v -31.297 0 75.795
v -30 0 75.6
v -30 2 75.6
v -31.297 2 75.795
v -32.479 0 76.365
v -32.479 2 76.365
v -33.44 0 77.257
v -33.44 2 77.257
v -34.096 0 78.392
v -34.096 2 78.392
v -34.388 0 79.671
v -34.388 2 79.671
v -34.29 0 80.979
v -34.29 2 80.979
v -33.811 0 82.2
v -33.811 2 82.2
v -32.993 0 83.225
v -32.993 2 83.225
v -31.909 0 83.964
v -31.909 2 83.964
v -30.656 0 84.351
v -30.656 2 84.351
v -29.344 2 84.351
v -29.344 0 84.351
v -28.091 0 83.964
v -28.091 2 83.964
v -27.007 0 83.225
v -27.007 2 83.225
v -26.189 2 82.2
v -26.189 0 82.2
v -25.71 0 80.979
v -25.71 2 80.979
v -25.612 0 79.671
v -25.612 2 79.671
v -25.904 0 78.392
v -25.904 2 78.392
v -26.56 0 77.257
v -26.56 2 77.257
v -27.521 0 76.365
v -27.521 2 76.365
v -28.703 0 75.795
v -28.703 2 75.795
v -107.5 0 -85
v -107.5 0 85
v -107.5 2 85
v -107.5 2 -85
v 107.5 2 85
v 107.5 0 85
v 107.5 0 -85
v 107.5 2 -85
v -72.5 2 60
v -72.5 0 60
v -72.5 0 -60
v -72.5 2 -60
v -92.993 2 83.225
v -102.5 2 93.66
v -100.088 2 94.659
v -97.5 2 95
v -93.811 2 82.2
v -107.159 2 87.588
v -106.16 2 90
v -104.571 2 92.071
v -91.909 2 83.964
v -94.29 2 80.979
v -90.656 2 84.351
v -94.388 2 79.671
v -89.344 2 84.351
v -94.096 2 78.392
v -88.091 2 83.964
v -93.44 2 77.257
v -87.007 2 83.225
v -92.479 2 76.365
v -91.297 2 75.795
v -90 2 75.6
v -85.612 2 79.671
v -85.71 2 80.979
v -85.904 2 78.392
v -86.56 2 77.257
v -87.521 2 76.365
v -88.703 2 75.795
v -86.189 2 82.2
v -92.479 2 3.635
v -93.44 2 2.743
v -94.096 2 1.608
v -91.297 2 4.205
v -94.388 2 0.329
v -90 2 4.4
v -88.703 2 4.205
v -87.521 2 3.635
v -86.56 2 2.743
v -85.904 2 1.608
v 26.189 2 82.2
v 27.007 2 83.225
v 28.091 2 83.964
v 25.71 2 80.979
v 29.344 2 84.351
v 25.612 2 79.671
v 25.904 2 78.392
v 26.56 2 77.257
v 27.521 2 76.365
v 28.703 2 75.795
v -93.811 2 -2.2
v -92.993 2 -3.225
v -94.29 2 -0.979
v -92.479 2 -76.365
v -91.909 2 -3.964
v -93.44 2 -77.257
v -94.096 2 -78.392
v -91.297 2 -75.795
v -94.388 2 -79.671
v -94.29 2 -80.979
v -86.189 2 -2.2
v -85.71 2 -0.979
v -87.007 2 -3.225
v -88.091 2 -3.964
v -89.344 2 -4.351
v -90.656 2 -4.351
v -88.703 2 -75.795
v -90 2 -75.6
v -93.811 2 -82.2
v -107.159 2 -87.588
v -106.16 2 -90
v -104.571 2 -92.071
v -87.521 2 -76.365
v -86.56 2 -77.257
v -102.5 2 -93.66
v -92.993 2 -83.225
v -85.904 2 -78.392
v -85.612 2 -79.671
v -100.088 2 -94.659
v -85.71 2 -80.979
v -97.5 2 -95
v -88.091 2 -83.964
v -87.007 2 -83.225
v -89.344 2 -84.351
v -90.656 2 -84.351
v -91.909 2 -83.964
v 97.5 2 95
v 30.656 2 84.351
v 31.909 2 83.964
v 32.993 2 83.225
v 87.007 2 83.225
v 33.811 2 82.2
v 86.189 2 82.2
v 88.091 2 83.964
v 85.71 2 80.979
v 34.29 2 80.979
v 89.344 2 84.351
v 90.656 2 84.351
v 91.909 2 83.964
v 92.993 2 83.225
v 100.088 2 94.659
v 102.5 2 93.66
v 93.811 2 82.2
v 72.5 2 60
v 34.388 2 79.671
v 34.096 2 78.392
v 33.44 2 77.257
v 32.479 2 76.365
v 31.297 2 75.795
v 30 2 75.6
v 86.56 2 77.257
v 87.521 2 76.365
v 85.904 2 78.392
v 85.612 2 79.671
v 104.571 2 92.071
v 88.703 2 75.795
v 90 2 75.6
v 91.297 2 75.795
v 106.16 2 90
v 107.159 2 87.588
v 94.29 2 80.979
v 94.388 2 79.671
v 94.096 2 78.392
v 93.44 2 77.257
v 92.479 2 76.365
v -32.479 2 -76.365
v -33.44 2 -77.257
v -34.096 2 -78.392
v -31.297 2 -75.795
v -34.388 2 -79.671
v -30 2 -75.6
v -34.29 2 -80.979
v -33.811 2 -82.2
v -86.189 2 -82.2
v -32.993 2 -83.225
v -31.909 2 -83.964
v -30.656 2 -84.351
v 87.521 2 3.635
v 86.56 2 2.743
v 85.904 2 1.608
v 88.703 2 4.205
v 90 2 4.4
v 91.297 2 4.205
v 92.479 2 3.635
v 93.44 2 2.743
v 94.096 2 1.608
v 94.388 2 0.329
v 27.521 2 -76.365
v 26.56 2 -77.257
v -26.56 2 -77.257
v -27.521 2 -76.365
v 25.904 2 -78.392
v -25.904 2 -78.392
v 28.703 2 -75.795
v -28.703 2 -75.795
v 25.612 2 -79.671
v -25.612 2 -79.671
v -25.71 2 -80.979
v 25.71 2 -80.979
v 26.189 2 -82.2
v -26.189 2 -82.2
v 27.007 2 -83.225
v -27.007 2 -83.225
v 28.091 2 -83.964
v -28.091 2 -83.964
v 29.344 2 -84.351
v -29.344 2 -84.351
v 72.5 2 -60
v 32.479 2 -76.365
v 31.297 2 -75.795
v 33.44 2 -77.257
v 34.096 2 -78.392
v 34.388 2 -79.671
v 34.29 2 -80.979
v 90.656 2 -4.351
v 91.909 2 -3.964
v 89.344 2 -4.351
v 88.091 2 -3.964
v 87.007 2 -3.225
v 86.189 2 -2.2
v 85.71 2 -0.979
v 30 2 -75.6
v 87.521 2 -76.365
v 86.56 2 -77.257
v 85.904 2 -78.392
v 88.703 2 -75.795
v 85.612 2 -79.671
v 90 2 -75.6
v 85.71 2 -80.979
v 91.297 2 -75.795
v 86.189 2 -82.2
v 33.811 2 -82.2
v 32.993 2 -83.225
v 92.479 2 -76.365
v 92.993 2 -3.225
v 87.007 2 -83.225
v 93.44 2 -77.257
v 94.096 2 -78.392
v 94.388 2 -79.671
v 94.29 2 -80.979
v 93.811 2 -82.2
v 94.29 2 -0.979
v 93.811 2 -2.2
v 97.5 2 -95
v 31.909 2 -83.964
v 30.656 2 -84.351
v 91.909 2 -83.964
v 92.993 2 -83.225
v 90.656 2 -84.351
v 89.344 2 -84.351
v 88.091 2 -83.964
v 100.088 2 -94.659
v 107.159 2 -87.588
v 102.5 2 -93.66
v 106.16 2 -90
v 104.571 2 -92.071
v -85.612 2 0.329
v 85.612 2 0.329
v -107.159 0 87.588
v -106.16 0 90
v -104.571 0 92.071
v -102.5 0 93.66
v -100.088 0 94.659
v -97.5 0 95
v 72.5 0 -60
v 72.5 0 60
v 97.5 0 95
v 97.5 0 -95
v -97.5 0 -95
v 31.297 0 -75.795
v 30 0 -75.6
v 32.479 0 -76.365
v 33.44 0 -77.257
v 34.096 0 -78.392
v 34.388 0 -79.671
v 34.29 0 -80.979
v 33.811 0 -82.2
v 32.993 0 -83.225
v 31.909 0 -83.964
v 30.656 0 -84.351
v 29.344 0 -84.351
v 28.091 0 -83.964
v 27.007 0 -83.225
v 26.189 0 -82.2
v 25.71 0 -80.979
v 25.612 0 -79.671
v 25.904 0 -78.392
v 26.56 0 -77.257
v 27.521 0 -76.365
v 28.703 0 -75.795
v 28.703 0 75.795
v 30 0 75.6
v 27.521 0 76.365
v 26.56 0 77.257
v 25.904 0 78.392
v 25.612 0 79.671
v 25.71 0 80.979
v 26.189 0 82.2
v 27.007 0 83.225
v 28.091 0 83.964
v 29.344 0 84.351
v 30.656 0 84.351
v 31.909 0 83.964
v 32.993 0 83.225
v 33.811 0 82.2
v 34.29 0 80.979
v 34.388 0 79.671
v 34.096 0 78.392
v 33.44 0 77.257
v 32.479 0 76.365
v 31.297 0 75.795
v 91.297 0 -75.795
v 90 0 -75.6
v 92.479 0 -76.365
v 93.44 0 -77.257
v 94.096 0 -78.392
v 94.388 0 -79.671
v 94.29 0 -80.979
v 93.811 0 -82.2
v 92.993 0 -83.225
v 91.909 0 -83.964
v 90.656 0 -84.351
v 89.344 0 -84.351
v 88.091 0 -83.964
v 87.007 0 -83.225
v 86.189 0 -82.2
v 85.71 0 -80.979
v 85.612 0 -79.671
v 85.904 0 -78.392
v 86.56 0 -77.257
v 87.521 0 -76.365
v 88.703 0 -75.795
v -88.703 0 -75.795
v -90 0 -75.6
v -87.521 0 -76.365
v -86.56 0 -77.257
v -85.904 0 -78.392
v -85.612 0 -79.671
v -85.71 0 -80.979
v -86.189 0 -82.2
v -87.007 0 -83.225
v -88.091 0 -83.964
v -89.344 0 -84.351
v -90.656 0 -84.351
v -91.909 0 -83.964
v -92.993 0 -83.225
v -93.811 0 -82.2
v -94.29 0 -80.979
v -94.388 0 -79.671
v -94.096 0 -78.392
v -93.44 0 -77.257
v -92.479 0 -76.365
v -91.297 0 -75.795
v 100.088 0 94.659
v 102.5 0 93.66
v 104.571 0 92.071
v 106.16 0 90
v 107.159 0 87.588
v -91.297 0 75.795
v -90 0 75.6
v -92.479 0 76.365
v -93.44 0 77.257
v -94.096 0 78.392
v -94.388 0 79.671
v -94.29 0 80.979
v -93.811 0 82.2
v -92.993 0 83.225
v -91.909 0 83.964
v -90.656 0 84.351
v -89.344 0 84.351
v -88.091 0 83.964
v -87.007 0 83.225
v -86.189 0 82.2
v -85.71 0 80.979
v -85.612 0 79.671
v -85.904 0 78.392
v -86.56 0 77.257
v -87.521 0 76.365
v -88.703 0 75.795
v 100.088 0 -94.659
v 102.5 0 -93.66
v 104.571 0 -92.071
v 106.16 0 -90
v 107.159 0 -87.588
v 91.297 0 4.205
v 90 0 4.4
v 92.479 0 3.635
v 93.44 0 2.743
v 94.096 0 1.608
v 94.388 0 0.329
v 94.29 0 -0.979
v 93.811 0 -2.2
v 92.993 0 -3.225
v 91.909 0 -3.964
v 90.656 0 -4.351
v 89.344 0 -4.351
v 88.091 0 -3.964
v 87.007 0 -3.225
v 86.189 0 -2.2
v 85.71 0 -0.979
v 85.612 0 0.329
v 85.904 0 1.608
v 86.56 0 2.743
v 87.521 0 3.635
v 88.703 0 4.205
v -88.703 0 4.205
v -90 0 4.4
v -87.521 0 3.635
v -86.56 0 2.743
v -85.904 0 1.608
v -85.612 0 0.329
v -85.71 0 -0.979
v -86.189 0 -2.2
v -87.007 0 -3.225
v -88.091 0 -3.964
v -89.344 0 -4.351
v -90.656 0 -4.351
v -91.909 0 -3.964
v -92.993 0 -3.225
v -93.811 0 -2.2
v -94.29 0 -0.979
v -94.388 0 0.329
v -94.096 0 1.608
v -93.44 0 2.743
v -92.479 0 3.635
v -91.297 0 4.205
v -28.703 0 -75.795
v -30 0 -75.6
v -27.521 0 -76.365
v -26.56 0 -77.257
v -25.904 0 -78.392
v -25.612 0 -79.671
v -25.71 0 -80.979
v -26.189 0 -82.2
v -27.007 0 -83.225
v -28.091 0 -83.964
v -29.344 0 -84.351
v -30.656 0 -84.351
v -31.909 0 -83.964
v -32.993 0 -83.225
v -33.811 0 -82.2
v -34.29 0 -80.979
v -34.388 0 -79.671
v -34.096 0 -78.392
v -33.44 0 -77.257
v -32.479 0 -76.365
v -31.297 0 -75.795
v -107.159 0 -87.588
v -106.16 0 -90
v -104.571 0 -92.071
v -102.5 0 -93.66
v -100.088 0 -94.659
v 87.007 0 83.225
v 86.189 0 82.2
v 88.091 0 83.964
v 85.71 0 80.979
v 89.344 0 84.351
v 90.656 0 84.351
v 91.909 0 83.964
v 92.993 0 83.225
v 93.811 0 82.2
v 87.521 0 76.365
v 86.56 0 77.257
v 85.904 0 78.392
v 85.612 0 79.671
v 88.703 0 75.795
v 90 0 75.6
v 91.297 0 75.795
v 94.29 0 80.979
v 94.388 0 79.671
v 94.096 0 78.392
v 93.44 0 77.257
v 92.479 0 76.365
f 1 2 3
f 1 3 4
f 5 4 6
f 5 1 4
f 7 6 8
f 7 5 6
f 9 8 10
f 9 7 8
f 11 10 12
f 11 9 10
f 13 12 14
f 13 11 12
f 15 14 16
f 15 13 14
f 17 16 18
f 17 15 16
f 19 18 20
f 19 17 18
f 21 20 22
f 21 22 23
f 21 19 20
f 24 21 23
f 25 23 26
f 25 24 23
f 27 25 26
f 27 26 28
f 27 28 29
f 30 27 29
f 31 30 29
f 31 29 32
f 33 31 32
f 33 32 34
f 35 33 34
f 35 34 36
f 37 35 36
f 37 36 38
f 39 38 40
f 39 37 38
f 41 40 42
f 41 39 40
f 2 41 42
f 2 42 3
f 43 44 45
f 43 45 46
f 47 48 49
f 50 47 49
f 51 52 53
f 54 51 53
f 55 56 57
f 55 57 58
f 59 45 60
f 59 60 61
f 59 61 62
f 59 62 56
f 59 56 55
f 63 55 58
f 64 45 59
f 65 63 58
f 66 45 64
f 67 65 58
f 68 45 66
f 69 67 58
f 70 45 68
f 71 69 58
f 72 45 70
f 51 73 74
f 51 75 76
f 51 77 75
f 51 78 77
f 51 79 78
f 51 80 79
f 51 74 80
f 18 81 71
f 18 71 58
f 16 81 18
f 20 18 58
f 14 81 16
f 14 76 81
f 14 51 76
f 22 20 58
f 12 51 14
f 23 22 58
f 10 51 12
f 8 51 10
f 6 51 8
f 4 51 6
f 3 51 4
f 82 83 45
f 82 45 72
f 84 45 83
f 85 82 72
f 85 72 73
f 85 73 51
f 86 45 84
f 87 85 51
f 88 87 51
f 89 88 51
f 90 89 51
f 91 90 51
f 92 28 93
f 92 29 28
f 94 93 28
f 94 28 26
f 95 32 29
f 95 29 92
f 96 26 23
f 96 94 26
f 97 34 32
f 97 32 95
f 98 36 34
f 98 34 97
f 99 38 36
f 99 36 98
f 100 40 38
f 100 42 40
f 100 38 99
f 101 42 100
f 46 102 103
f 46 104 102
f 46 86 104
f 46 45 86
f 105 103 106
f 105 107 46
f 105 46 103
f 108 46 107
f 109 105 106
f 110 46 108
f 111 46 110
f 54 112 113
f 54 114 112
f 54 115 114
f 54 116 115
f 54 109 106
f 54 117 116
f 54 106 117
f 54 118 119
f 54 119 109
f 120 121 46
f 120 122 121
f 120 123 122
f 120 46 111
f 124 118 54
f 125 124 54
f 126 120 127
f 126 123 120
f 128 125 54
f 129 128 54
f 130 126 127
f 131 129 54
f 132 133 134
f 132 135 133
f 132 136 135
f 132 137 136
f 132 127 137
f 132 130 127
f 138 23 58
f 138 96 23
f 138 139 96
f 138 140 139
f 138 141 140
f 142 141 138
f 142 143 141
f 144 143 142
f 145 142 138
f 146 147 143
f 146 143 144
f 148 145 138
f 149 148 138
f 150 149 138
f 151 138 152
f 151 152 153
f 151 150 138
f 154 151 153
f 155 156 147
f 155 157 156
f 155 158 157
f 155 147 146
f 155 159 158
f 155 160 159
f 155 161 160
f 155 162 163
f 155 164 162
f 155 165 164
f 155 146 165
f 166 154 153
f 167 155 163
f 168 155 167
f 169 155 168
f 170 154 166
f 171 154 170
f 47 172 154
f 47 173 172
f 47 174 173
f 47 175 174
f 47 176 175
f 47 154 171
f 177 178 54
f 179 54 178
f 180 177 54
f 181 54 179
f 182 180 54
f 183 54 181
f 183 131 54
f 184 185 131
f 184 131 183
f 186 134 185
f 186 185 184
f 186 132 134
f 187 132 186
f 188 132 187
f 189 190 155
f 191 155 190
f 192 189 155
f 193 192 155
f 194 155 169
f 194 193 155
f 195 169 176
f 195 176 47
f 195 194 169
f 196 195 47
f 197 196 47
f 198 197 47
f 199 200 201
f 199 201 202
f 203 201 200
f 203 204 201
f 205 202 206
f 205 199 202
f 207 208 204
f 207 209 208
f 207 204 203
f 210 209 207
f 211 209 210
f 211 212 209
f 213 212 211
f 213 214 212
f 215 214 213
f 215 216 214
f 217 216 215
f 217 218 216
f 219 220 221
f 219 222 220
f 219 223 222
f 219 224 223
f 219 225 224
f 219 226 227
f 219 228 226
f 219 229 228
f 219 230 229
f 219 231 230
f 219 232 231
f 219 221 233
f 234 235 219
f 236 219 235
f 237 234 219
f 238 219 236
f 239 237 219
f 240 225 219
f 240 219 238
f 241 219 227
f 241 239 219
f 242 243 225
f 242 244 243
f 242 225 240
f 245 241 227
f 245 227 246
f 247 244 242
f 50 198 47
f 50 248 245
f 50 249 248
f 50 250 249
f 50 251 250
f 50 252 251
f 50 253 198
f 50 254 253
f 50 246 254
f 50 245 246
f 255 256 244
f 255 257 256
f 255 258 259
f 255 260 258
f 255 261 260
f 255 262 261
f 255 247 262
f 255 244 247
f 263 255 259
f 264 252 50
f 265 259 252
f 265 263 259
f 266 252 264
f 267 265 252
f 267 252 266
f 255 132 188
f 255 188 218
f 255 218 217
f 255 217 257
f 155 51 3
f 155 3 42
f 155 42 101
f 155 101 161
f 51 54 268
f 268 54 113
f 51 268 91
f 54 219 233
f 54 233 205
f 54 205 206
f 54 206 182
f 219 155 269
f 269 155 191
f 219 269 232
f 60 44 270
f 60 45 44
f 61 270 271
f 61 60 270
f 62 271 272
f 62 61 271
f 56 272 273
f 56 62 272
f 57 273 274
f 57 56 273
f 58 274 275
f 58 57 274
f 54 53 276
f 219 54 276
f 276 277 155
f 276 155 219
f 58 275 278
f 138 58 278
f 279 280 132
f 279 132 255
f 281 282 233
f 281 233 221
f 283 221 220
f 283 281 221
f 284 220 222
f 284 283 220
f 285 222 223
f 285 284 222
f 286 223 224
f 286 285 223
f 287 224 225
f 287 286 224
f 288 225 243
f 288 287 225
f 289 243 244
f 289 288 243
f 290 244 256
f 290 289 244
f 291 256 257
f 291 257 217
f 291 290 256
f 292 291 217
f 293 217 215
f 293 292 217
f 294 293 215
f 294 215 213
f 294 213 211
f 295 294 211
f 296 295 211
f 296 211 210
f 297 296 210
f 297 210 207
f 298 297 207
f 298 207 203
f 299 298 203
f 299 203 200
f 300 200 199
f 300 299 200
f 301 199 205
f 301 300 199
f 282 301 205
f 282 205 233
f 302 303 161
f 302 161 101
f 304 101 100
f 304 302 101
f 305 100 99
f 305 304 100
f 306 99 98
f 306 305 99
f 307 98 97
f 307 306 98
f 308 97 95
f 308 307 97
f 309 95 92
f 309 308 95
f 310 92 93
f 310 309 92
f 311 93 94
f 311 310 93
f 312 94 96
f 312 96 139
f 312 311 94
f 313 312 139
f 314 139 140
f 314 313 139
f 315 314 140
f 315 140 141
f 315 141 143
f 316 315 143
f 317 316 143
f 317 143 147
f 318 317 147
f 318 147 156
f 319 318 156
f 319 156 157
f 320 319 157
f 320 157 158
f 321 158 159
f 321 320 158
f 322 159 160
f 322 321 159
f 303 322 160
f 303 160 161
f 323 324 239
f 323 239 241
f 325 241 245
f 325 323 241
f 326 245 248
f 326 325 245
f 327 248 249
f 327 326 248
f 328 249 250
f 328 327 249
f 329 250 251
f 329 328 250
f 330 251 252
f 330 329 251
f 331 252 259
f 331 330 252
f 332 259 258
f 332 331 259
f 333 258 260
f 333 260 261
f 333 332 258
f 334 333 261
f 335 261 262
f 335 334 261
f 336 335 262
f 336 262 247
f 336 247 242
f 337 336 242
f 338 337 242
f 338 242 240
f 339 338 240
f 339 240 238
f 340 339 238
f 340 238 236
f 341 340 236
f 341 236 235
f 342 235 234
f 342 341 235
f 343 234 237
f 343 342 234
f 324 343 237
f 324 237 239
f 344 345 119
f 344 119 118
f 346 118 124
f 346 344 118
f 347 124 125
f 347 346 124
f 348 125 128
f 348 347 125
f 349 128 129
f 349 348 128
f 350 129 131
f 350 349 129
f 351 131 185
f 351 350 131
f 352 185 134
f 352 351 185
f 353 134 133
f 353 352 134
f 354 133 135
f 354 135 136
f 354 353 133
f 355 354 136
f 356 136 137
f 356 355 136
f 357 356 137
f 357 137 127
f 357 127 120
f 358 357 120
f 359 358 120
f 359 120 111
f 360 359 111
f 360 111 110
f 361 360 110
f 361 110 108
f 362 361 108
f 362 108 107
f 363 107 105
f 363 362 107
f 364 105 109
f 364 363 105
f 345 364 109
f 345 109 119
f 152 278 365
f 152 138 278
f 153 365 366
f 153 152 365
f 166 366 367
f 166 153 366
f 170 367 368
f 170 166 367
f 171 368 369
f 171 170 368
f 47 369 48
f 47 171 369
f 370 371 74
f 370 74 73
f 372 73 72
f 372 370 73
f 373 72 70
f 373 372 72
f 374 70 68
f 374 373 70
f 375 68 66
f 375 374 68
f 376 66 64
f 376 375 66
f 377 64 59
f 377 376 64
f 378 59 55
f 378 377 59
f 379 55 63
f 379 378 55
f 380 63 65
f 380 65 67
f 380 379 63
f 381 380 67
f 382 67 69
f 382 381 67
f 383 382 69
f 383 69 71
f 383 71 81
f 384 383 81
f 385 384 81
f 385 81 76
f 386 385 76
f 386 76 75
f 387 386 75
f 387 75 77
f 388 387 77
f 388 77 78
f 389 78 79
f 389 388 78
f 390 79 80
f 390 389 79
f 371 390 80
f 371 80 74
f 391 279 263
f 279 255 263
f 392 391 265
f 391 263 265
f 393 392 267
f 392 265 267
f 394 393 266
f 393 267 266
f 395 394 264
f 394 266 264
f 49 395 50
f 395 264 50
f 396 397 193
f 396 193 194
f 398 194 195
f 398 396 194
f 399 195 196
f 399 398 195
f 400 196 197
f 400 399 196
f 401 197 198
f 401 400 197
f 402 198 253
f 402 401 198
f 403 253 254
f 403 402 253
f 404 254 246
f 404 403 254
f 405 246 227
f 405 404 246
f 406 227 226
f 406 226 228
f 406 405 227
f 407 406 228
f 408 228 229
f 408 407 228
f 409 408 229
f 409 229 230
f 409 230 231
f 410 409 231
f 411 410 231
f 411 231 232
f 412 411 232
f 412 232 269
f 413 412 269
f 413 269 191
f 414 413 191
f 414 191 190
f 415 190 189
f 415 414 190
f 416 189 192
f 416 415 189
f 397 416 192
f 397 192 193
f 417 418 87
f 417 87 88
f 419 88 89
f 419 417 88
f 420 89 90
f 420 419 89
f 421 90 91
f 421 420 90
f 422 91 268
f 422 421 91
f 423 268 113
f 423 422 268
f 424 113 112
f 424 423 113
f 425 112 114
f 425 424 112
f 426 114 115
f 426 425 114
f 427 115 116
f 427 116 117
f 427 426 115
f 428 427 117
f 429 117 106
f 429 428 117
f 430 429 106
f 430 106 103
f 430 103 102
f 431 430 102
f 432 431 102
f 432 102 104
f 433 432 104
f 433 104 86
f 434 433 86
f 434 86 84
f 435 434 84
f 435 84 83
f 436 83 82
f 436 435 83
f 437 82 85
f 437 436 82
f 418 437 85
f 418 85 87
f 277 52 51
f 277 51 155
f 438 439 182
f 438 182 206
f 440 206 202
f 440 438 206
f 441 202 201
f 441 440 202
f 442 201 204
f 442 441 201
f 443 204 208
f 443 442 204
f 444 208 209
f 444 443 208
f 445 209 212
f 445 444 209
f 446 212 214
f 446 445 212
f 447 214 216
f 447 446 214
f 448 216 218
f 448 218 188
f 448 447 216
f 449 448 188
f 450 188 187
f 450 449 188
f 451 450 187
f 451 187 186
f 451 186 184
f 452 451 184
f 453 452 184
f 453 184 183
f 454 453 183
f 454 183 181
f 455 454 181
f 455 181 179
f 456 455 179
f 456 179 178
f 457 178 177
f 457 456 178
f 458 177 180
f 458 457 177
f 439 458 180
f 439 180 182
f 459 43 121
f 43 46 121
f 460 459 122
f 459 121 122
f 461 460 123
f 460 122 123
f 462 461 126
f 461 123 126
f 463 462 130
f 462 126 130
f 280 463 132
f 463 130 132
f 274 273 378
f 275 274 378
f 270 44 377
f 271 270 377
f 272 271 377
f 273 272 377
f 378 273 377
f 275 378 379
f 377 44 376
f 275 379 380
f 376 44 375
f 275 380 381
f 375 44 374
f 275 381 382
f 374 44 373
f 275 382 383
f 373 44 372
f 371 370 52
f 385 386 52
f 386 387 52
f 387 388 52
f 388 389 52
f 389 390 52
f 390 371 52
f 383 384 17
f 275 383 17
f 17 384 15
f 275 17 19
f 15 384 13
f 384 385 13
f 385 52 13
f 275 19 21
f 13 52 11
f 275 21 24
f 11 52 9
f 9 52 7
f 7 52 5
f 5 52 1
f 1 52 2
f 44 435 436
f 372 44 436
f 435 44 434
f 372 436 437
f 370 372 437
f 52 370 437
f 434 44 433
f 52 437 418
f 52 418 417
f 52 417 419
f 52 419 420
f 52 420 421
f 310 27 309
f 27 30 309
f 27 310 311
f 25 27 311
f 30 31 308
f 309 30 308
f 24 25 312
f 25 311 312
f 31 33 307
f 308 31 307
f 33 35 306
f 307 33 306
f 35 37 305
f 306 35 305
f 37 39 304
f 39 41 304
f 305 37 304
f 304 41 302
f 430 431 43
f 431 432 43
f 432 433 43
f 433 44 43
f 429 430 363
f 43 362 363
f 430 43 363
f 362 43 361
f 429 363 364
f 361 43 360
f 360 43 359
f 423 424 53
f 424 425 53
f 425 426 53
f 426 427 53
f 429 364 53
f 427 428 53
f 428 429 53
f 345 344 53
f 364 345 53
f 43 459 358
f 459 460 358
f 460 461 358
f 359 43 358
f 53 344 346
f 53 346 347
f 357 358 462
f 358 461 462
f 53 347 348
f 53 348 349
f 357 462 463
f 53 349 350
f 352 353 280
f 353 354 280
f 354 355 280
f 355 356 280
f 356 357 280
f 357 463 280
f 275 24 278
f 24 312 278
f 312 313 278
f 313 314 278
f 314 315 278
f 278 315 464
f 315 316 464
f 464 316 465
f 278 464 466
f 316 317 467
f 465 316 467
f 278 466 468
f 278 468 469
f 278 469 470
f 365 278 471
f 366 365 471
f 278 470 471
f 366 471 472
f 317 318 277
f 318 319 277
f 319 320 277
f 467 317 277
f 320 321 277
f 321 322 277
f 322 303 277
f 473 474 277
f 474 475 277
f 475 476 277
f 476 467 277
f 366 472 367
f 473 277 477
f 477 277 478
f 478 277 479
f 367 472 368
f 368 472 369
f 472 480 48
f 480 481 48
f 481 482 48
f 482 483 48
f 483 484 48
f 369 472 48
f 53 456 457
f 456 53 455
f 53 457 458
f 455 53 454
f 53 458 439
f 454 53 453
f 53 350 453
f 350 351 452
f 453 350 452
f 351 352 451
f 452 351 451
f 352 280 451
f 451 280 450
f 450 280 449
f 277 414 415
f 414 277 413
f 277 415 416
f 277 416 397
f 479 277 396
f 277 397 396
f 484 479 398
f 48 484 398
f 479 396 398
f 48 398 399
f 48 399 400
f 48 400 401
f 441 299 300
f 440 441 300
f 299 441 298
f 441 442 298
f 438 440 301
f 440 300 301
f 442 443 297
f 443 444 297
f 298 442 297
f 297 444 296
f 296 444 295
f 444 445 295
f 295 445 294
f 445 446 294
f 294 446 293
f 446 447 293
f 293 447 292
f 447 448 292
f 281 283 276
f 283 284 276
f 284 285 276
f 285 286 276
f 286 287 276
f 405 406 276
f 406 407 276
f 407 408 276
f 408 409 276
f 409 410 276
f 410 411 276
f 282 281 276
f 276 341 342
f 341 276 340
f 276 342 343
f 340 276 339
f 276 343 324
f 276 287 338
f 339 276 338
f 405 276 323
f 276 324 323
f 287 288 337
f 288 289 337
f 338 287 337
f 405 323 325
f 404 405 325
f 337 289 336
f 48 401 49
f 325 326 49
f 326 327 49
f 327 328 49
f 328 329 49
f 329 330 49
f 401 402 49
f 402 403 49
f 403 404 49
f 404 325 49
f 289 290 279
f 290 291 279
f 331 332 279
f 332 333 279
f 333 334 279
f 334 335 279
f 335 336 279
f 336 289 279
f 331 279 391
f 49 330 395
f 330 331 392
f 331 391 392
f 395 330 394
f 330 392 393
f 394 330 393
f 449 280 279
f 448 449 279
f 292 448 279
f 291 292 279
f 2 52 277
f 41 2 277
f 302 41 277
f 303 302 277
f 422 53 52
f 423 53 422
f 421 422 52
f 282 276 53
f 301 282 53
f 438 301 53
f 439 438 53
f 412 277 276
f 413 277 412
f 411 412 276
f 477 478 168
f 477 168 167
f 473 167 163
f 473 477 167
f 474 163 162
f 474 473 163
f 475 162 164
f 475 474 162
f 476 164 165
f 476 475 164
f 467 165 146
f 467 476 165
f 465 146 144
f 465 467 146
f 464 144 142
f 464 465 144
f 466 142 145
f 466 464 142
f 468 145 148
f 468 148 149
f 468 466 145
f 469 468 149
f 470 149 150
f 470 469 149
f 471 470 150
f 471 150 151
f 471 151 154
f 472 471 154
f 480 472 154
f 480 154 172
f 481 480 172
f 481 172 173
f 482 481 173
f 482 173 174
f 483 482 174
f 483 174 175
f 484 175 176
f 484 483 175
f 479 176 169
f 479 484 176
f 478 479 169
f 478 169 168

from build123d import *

# Parameters (mm, degrees)
SKETCH_1_W      = 215
SKETCH_1_H      = 190
SKETCH_1_R      = 4.4
SKETCH_1_W_2    = 145
SKETCH_1_H_2    = 120
EXTRUDE_1_DEPTH = 2
FILLET_1_R      = 10


with BuildPart() as part:
    # Эскиз1 → Бобышка-Вытянуть1 (new body)
    with BuildSketch(Plane(origin=(0, 0, 0), x_dir=(1, 0, 0), z_dir=(0, 1, 0))):
        Rectangle(SKETCH_1_W, SKETCH_1_H)
        with Locations(Location((-90, 80, 0), (0, 0, 270))):
            Circle(SKETCH_1_R, mode=Mode.SUBTRACT)
        with Locations(Location((-90, -80, 0), (0, 0, 90))):
            Circle(SKETCH_1_R, mode=Mode.SUBTRACT)
        with Locations(Location((-90, 0, 0), (0, 0, 270))):
            Circle(SKETCH_1_R, mode=Mode.SUBTRACT)
        with Locations(Location((-30, -80, 0), (0, 0, 90))):
            Circle(SKETCH_1_R, mode=Mode.SUBTRACT)
        with Locations(Location((-30, 80, 0), (0, 0, 270))):
            Circle(SKETCH_1_R, mode=Mode.SUBTRACT)
        with Locations(Location((30, -80, 0), (0, 0, 90))):
            Circle(SKETCH_1_R, mode=Mode.SUBTRACT)
        with Locations(Location((30, 80, 0), (0, 0, 270))):
            Circle(SKETCH_1_R, mode=Mode.SUBTRACT)
        with Locations(Location((90, -80, 0), (0, 0, 90))):
            Circle(SKETCH_1_R, mode=Mode.SUBTRACT)
        with Locations(Location((90, 0, 0), (0, 0, 270))):
            Circle(SKETCH_1_R, mode=Mode.SUBTRACT)
        with Locations(Location((90, 80, 0), (0, 0, 270))):
            Circle(SKETCH_1_R, mode=Mode.SUBTRACT)
        Rectangle(SKETCH_1_W_2, SKETCH_1_H_2, mode=Mode.SUBTRACT)
    extrude(amount=EXTRUDE_1_DEPTH)

    # Скругление1
    fillet_1_edges = [part.edges().sort_by_distance(p)[0] for p in [
        (107.5, 1, -95),
        (107.5, 1, 95),
        (-107.5, 1, 95),
        (-107.5, 1, -95),
    ]]
    fillet(fillet_1_edges, radius=FILLET_1_R)


solid = part.part
